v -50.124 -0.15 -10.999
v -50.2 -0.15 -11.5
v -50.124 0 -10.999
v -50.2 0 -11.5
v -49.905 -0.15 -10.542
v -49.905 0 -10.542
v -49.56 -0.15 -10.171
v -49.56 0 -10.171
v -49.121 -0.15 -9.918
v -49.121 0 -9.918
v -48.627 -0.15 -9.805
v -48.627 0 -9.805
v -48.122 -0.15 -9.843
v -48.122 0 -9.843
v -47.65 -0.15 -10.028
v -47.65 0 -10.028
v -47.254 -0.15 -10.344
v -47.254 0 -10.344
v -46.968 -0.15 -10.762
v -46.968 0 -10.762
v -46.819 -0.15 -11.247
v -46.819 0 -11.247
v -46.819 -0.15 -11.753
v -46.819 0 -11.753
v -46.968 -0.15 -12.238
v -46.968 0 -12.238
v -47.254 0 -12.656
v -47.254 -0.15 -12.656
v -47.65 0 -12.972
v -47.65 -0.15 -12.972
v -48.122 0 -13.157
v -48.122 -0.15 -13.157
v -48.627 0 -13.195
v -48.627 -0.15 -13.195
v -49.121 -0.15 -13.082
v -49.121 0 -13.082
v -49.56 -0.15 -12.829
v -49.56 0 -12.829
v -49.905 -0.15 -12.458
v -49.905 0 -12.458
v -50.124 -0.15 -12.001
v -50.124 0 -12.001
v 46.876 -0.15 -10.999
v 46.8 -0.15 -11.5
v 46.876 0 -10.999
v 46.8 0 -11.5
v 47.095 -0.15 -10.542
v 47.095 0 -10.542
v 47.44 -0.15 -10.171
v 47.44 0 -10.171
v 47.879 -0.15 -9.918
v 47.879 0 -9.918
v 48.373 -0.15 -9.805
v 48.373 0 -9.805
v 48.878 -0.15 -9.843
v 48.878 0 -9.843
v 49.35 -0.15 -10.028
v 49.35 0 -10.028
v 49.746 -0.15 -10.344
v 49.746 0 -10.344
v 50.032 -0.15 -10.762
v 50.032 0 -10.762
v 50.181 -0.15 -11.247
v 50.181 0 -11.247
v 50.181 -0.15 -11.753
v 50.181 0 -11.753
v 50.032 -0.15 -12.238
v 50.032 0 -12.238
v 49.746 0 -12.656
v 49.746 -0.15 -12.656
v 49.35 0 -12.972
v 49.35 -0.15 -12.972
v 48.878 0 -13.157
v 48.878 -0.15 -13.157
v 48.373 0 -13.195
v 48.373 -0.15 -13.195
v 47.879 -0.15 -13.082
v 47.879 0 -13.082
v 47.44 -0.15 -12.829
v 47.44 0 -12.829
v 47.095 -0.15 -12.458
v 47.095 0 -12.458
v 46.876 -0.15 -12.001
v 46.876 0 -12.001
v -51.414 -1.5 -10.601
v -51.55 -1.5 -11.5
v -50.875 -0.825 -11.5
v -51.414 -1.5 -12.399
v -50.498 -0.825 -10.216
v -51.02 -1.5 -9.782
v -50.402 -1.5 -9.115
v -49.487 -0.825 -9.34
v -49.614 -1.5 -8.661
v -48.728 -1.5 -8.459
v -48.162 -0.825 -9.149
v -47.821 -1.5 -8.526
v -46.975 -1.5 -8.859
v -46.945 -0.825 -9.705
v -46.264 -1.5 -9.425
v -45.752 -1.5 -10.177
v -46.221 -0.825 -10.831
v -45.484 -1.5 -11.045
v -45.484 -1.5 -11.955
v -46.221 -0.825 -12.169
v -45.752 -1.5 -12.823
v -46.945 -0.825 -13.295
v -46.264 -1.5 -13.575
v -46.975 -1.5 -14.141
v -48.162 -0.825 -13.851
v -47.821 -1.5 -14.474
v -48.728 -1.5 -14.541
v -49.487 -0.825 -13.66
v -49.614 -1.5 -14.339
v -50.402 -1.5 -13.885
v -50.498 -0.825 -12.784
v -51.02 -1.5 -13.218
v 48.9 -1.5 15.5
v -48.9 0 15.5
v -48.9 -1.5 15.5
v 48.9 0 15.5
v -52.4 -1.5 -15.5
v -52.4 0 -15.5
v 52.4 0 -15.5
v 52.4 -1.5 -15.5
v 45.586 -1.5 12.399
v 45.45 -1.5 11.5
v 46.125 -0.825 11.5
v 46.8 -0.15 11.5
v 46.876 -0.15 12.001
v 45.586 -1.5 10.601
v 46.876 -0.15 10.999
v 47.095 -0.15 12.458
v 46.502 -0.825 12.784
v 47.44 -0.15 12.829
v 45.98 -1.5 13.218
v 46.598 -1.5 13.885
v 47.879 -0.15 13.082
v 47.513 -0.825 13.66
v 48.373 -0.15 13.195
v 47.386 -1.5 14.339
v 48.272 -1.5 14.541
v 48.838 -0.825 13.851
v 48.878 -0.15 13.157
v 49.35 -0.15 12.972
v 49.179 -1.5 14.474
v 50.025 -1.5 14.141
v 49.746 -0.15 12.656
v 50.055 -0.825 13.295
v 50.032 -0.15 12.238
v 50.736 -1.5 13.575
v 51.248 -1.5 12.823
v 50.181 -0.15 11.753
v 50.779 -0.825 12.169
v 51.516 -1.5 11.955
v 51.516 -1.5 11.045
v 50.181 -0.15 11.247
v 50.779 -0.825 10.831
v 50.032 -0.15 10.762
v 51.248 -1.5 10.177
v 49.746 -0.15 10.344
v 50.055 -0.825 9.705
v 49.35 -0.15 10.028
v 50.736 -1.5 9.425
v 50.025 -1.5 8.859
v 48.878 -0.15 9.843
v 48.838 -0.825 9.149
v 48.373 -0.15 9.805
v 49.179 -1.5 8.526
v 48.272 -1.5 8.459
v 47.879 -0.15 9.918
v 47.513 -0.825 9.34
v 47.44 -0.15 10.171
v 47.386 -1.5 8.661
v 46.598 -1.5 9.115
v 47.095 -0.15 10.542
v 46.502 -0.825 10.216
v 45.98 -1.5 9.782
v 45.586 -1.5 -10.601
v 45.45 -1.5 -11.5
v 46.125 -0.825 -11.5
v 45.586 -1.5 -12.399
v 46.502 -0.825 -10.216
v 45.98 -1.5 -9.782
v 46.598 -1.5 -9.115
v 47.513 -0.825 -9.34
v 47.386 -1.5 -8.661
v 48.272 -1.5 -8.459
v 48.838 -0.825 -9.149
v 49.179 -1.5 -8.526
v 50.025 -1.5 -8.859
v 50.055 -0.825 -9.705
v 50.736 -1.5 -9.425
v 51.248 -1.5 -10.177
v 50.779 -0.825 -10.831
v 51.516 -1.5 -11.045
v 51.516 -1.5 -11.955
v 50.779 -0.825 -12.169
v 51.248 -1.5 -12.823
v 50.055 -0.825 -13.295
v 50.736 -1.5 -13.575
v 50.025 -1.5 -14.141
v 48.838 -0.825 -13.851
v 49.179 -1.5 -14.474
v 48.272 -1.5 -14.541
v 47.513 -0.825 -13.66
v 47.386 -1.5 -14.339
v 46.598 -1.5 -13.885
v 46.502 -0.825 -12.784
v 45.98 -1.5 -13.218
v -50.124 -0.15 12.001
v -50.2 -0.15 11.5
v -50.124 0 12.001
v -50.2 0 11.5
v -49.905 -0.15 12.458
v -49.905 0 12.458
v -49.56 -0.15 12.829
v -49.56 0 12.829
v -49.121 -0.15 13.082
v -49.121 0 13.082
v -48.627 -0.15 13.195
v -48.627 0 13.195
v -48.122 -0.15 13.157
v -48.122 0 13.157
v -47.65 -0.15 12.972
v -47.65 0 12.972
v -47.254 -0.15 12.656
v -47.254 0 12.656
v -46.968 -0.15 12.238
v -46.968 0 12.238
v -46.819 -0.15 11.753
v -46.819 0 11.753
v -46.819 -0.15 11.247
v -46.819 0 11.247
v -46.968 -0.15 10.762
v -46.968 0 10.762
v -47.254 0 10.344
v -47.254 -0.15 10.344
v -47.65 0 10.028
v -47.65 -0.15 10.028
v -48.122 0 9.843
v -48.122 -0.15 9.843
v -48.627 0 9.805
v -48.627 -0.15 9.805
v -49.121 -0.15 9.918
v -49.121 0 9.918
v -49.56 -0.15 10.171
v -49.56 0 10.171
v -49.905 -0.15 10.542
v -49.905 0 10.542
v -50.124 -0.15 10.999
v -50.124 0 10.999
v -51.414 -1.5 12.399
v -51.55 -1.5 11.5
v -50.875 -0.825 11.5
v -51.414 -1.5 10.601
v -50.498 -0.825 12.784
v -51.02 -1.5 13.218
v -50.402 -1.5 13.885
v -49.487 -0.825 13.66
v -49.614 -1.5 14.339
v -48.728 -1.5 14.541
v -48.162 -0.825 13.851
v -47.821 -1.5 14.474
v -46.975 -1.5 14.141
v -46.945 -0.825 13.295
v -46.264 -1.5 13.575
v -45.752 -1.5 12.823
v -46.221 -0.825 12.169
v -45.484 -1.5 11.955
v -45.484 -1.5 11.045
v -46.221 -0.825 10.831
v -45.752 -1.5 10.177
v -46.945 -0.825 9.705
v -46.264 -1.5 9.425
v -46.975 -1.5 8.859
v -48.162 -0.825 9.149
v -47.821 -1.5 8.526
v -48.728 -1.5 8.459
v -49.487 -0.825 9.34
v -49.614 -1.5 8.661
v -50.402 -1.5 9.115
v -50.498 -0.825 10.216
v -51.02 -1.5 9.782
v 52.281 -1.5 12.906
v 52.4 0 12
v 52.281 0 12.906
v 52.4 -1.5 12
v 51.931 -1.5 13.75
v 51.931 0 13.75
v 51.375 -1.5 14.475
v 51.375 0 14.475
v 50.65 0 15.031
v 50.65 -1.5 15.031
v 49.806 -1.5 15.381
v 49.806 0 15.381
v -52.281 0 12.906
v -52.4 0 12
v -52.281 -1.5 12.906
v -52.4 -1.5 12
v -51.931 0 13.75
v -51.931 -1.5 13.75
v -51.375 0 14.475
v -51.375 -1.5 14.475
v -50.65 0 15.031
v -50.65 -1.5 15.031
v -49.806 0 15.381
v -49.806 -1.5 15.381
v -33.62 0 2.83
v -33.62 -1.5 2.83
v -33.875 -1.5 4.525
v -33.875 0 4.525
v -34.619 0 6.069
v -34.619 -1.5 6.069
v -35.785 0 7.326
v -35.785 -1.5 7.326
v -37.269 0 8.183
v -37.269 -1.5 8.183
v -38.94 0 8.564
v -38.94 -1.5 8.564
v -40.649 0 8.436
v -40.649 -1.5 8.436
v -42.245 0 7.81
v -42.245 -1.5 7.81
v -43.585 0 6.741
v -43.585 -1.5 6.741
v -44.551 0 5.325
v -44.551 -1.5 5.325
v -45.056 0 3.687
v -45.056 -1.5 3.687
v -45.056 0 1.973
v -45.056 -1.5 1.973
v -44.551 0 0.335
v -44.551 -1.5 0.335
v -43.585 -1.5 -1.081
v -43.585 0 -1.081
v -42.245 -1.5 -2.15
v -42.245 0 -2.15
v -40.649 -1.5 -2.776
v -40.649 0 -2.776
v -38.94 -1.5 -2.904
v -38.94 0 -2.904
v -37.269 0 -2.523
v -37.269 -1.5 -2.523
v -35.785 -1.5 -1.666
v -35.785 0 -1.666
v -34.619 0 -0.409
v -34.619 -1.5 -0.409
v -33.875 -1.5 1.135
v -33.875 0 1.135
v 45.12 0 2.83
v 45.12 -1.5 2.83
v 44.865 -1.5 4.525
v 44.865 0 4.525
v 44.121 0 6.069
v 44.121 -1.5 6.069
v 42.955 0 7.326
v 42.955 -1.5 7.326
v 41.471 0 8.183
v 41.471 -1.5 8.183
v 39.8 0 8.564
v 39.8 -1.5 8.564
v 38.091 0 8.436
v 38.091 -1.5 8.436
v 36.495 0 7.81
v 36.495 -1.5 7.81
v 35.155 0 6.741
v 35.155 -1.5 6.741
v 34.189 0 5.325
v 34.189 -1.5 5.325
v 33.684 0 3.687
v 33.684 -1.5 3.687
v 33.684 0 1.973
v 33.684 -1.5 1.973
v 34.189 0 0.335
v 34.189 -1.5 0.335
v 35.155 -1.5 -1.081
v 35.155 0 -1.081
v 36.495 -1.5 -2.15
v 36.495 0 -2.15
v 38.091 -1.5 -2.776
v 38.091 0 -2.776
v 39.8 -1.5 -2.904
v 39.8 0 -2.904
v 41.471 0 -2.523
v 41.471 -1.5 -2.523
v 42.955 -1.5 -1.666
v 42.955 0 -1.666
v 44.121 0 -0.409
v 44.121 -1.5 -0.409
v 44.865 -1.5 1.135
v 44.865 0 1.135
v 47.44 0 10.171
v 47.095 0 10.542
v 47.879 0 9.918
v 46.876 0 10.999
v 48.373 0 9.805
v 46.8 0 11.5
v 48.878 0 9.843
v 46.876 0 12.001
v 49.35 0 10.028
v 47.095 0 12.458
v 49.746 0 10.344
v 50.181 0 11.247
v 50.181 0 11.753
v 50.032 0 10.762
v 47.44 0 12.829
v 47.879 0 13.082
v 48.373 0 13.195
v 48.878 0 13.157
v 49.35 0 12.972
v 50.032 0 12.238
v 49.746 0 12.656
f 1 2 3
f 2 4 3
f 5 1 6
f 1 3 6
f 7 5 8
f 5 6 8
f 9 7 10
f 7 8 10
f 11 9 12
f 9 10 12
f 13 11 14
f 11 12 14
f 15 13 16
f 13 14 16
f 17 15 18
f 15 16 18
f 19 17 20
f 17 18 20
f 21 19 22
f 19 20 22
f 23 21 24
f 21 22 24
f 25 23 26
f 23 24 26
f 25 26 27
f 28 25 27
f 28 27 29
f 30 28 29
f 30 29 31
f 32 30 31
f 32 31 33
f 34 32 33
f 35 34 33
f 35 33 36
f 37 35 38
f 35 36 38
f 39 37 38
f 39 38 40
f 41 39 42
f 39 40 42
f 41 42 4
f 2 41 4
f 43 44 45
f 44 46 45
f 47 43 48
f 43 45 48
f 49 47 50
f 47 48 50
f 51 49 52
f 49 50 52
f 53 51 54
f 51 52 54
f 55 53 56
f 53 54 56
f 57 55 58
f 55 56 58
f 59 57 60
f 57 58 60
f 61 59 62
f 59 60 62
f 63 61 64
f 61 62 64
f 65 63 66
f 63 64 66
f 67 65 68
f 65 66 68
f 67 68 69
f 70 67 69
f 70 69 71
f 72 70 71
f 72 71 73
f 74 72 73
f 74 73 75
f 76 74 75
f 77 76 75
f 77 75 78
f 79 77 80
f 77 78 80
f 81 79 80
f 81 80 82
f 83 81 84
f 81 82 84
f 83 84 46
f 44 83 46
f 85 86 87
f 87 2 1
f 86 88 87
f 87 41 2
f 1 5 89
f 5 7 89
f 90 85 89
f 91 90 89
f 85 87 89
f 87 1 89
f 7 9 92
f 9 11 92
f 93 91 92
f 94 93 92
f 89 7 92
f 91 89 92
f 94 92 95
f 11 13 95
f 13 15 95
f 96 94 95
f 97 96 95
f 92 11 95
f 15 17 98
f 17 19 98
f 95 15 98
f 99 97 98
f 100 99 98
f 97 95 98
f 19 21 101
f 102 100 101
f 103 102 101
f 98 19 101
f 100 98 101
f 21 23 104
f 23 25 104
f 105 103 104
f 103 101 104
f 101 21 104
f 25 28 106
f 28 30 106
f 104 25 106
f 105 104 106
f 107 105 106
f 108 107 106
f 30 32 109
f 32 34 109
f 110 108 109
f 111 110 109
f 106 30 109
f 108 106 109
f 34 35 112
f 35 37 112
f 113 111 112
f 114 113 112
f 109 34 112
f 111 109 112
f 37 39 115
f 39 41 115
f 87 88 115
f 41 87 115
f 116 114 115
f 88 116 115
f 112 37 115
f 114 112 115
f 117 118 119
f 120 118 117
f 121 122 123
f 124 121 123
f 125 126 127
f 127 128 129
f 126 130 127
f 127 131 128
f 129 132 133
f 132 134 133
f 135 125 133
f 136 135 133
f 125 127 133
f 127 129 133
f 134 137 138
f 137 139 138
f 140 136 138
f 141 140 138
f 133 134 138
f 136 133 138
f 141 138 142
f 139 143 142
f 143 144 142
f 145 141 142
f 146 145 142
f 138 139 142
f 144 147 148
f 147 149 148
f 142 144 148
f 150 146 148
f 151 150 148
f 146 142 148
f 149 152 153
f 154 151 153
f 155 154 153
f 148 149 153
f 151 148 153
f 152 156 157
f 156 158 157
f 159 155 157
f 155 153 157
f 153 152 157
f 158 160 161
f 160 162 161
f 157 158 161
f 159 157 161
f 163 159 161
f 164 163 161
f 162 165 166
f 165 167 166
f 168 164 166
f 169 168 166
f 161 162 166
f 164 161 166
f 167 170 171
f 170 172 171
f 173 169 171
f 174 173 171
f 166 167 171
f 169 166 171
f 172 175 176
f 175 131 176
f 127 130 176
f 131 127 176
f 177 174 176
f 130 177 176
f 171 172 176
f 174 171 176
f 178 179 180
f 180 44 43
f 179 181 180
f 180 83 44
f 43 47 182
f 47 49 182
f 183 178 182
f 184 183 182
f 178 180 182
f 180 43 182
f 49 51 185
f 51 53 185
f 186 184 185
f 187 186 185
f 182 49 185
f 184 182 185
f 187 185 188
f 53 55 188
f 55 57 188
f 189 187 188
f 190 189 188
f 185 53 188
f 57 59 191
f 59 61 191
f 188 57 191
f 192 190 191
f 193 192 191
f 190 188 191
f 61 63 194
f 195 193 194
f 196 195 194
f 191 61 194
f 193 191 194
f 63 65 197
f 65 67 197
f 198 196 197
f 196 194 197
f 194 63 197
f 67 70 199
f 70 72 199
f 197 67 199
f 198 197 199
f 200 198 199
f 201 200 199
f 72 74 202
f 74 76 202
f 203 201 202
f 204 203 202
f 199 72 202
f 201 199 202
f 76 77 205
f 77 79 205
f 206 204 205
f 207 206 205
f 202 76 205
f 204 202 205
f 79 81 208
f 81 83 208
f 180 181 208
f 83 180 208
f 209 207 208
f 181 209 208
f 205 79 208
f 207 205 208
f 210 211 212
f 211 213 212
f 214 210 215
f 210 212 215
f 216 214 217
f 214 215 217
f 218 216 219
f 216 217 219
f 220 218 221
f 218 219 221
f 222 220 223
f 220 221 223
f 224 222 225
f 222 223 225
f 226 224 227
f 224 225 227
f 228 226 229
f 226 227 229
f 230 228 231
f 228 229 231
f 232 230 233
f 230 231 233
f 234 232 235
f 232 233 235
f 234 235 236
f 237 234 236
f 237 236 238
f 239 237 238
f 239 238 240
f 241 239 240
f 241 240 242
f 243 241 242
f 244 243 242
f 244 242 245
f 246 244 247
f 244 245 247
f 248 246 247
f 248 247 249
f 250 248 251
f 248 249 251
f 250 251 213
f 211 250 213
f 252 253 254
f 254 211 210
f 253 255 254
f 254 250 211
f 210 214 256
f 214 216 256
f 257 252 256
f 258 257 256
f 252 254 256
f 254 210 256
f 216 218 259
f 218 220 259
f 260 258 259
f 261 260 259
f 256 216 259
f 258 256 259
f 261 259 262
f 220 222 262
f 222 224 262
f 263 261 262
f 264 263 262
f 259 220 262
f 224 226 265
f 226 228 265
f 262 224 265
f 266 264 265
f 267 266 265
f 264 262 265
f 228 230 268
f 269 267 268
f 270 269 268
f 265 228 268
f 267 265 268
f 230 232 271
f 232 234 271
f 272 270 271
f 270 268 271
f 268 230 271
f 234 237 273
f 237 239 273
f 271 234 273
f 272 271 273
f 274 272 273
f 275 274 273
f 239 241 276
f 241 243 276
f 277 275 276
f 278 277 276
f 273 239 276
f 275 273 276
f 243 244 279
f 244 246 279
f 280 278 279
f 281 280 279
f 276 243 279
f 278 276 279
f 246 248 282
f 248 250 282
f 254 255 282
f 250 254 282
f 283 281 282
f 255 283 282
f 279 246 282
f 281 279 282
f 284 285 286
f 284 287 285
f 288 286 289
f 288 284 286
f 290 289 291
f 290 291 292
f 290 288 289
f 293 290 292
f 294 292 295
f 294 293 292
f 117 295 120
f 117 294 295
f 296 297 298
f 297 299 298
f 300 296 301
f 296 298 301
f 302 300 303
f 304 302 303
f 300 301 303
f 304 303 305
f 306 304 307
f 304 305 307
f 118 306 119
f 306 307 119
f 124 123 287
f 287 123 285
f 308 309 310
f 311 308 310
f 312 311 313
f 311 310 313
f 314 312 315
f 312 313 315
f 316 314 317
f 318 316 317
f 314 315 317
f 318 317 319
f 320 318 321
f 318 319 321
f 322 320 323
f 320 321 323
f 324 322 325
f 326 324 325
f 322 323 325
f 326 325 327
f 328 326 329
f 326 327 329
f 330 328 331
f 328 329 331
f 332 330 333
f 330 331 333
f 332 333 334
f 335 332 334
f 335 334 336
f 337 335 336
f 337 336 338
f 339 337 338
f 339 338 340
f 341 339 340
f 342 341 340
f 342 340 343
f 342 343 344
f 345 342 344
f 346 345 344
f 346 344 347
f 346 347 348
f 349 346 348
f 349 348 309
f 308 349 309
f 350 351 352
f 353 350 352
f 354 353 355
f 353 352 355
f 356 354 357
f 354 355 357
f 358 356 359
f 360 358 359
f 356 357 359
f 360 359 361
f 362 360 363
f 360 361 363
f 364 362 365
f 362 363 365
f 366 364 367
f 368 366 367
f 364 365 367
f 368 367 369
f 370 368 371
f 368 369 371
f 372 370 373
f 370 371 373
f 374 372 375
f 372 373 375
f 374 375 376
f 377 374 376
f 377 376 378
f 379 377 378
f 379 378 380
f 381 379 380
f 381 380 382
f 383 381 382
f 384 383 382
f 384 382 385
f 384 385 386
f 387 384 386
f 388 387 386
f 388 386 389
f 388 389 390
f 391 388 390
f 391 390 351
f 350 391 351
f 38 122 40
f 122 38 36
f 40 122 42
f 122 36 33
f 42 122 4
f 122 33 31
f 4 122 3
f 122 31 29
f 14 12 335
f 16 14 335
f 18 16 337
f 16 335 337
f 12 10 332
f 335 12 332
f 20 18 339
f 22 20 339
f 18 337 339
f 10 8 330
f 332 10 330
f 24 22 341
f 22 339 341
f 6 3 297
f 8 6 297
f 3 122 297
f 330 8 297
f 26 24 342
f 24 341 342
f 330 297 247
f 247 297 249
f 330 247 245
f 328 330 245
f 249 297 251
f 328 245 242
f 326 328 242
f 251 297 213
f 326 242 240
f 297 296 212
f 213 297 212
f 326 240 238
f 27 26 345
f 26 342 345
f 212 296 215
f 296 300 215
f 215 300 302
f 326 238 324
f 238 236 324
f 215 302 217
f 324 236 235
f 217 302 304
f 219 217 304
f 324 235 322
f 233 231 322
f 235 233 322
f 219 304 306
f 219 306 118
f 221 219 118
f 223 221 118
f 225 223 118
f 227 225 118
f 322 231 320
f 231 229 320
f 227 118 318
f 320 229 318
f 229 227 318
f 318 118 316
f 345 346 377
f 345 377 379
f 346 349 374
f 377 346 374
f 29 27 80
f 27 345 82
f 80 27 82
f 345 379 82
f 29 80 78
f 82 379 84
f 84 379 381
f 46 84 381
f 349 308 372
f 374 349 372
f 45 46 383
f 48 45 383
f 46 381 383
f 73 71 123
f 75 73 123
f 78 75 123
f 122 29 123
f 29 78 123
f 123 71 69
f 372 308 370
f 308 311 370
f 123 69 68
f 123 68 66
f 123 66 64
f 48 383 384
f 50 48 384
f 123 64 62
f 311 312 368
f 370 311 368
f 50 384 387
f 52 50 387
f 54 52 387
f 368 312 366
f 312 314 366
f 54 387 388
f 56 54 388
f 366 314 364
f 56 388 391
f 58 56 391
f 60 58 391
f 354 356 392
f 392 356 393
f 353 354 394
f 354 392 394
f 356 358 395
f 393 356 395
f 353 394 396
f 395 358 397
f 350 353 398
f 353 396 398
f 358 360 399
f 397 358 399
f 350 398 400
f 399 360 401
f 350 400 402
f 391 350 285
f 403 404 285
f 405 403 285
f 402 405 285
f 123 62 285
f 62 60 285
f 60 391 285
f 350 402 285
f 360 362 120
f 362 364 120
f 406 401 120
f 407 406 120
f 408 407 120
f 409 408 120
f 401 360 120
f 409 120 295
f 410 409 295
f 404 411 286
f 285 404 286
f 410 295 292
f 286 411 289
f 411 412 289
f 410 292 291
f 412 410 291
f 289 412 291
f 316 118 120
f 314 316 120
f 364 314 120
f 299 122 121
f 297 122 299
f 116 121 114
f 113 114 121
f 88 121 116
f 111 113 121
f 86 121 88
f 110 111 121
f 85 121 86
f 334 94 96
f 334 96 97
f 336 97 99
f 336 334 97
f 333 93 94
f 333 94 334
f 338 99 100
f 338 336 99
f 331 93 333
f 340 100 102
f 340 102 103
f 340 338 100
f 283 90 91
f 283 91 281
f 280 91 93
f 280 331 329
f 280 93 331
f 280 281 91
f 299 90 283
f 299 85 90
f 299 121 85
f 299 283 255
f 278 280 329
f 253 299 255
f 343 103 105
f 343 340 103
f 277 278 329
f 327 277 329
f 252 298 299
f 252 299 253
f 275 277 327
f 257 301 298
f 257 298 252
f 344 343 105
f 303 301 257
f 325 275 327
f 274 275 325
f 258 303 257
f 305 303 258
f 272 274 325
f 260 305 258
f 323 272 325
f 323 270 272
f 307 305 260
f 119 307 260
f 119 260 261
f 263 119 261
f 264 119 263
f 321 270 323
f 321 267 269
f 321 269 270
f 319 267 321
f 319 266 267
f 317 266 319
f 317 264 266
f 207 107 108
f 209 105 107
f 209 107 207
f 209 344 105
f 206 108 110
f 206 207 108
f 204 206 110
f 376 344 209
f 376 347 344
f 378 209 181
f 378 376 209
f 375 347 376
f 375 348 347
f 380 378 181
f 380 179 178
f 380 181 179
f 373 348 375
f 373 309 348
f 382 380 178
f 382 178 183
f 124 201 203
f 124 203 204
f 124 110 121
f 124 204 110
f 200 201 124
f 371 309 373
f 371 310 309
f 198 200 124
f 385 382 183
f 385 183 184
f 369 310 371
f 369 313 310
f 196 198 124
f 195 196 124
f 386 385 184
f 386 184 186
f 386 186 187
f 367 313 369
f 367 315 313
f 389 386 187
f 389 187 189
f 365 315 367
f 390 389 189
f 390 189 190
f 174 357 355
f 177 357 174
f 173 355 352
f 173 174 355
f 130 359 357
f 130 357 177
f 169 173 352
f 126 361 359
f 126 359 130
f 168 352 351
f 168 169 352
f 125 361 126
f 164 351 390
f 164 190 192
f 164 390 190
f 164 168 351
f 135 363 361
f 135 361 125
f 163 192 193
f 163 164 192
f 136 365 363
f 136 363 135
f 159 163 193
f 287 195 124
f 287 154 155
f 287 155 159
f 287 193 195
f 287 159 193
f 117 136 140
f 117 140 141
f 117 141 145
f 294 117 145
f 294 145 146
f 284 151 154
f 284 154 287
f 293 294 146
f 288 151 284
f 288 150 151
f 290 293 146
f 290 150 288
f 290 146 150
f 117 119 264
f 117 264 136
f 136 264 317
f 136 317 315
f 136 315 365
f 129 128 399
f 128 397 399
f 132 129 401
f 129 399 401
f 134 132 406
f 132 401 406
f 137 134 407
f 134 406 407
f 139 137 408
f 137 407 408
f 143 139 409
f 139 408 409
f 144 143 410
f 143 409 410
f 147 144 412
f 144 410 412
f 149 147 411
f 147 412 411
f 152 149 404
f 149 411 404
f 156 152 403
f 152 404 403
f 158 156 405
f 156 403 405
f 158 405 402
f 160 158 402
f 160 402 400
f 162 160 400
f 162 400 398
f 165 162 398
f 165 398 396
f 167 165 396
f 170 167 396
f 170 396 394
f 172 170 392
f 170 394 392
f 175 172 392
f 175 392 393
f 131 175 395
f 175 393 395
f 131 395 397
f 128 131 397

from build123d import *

# Parameters (mm, degrees)
SKETCH_W            = 104.8
SKETCH_H            = 31
PAD_DEPTH           = 1.5
HOLE_D              = 3.4
HOLE_DEPTH          = 25
HOLE_CSINK_D        = 6.1
HOLE_CSINK_ANGLE    = 90
FILLET_R            = 3.5
SKETCH002_R         = 5.75
POCKET_DEPTH        = 1.501
LINEARPATTERN_COUNT = 2
LINEARPATTERN_PITCH = 78.74


with BuildPart() as part:
    # Sketch → Pad (new body)
    with BuildSketch(Plane.XZ):
        Rectangle(SKETCH_W, SKETCH_H)
    extrude(amount=PAD_DEPTH)

    # Hole
    with Locations(Plane.XZ.offset(1.5)):
        with Locations((-48.5, 11.5), (-48.5, -11.5), (48.5, -11.5), (48.5, 11.5)):
            CounterSinkHole(HOLE_D / 2, HOLE_CSINK_D / 2, depth=HOLE_DEPTH, counter_sink_angle=HOLE_CSINK_ANGLE)

    # Fillet
    fillet_edges = [part.edges().sort_by_distance(p)[0] for p in [
        (-52.4, -0.75, 15.5),
        (52.4, -0.75, 15.5),
    ]]
    fillet(fillet_edges, radius=FILLET_R)

    # Sketch002 (on Face5 of Fillet) → Pocket (cut, through all)
    with BuildSketch(Plane.XZ.offset(1.5)):
        with Locations((-39.37, 2.83)):
            Circle(SKETCH002_R)
    pocket = extrude(amount=-POCKET_DEPTH, mode=Mode.SUBTRACT)

    # LinearPattern: Pocket ×2
    with Locations(*[(i * LINEARPATTERN_PITCH, 0, 0) for i in range(1, LINEARPATTERN_COUNT)]):
        add(pocket, mode=Mode.SUBTRACT)


solid = part.part
